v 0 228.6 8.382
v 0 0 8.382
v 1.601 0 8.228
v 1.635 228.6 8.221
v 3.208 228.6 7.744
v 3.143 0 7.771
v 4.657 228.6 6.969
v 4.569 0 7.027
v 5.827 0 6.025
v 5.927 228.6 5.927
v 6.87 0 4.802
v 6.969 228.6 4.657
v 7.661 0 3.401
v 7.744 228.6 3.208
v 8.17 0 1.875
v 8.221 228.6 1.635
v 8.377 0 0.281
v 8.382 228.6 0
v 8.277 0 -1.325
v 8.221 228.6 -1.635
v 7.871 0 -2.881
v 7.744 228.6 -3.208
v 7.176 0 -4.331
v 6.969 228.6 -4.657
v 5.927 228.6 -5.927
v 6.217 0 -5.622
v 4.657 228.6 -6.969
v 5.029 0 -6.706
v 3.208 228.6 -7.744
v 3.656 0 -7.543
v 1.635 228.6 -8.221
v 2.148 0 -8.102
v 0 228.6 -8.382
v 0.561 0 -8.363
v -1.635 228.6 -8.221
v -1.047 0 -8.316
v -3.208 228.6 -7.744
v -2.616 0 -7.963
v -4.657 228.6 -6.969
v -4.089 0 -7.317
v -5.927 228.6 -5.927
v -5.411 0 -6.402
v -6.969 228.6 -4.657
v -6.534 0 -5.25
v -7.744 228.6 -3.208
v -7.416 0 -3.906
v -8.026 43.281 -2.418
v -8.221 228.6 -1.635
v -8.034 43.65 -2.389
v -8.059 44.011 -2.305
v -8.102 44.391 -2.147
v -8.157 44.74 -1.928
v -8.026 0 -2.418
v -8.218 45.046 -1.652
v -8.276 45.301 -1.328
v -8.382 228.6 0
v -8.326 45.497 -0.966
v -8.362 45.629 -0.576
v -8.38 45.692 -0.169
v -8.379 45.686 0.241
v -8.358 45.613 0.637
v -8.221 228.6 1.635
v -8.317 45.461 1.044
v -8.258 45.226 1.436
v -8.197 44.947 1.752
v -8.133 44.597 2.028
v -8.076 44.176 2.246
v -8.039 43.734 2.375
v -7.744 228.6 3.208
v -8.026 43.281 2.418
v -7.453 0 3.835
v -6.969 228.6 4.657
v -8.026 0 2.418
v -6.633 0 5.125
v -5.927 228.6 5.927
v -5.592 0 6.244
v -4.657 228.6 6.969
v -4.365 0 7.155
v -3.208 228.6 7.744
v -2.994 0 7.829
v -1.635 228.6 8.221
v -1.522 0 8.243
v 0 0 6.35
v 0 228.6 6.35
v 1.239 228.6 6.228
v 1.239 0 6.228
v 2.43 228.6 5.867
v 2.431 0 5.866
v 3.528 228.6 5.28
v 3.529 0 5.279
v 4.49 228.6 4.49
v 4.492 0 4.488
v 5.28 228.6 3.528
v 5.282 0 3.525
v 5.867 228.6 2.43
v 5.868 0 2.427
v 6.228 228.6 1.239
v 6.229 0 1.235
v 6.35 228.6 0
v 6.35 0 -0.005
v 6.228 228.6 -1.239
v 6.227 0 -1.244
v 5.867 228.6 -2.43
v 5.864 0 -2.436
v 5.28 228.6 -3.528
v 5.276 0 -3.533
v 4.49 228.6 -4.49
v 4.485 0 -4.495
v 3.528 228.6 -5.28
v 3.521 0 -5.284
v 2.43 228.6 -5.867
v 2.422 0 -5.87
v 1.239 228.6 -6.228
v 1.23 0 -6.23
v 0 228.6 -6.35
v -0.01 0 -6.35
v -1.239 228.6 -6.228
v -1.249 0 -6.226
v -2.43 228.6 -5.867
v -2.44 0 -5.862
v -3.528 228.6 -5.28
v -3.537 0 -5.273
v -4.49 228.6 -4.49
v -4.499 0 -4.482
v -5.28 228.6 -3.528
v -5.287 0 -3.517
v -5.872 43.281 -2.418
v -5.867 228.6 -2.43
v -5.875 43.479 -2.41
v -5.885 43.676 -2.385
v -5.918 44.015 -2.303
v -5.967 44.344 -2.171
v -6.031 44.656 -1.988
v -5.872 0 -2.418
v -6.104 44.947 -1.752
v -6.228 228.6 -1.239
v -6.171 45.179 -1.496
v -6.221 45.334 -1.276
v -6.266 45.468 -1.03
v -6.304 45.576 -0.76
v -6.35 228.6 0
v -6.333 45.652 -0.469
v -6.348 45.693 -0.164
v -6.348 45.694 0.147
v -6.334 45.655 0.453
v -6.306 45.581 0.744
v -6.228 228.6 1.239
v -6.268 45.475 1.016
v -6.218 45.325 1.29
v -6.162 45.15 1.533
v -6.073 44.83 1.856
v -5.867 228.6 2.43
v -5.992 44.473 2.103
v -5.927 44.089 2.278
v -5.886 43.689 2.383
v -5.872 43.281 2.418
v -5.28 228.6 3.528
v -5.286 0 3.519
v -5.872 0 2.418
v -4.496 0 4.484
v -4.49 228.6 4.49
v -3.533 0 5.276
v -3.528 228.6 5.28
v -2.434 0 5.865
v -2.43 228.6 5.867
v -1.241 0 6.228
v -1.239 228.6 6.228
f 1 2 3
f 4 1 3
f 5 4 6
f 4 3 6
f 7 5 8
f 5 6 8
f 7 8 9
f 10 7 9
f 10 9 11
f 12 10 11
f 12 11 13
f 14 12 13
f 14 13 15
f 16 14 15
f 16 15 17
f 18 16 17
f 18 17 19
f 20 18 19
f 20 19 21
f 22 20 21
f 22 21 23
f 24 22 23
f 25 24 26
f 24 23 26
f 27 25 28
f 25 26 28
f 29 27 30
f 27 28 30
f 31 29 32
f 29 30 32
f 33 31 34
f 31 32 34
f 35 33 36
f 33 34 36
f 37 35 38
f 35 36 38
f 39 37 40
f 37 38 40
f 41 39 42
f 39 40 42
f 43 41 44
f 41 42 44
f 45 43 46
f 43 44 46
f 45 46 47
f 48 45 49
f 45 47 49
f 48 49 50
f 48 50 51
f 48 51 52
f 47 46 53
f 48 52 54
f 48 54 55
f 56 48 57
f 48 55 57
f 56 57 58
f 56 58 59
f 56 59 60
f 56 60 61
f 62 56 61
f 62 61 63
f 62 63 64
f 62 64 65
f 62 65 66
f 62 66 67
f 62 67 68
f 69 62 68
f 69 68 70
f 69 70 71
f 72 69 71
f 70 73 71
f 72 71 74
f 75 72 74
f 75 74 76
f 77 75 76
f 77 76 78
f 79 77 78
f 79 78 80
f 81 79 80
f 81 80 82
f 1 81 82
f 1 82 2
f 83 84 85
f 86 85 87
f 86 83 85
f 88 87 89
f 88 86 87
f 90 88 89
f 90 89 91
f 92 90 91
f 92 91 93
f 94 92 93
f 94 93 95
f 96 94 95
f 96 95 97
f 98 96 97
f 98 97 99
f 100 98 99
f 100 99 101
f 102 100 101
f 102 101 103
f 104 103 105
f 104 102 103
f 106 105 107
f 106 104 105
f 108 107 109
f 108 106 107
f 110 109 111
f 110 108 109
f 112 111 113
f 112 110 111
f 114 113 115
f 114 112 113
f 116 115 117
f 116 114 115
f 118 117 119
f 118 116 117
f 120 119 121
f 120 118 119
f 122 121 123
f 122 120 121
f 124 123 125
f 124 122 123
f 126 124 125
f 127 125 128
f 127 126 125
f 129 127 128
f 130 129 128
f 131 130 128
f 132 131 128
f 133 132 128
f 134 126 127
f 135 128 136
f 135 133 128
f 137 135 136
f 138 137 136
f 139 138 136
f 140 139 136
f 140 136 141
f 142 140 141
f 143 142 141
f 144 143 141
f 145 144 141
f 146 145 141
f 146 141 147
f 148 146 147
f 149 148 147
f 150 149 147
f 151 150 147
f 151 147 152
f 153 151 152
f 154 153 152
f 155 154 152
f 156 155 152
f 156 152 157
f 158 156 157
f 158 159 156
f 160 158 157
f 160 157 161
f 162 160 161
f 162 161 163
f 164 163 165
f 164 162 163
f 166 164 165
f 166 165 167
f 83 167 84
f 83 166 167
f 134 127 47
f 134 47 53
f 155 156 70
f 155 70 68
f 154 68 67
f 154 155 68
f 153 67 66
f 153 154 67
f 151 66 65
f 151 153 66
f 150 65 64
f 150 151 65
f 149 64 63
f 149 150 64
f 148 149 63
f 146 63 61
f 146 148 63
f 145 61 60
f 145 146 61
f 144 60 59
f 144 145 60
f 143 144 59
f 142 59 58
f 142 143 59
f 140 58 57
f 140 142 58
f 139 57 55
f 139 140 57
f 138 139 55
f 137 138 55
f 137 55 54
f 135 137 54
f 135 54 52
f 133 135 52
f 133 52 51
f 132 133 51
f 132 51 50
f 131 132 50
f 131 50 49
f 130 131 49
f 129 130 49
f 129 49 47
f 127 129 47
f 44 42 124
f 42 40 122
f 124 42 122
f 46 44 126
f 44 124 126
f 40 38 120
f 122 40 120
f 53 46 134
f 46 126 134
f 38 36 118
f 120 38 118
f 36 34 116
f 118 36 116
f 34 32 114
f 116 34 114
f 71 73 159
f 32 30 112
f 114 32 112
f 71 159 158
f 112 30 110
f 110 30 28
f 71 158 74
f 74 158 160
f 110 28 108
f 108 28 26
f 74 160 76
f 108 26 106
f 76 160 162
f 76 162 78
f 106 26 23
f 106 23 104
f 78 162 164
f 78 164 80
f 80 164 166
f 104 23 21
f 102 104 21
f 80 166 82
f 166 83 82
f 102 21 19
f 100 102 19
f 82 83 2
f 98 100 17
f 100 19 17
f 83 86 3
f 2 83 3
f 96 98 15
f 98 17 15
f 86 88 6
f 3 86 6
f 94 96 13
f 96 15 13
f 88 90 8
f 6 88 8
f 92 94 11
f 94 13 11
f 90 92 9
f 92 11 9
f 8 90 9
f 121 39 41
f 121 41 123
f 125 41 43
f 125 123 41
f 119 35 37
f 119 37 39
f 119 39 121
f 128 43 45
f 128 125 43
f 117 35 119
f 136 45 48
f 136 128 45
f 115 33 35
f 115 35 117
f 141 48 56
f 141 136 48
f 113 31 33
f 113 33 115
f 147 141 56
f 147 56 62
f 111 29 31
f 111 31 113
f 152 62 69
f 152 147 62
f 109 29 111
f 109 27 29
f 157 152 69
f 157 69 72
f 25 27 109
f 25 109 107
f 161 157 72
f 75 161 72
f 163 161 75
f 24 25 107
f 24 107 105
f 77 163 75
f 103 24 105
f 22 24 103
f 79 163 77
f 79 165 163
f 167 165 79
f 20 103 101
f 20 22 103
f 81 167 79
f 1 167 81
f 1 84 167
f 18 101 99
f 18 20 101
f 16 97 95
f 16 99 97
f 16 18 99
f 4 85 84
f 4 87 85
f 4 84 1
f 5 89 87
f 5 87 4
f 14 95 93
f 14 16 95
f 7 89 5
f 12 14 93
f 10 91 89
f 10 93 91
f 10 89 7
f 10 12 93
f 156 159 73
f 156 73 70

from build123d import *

# Parameters (mm, degrees)
SKETCH1_R           = 8.382
SKETCH1_R_2         = 6.35
BOSS_EXTRUDE1_DEPTH = 228.6
CUT_EXTRUDE1_DEPTH  = 228.6


with BuildPart() as part:
    # Sketch1 → Boss-Extrude1 (new body)
    with BuildSketch(Plane(origin=(0, 0, 0), x_dir=(1, 0, 0), z_dir=(0, 1, 0))):
        with Locations(Location((0, 0, 0), (0, 0, 270))):
            Circle(SKETCH1_R)
        with Locations(Location((0, 0, 0), (0, 0, 270))):
            Circle(SKETCH1_R_2, mode=Mode.SUBTRACT)
    extrude(amount=BOSS_EXTRUDE1_DEPTH)

    # Sketch3 → Cut-Extrude1 (cut)
    with BuildSketch(Plane(origin=(0, 0, 0), x_dir=(0, 0, -1), z_dir=(1, 0, 0))):
        with BuildLine():
            Line((-2.417681697, -8.09513592), (-2.417681697, 43.280600145))
            ThreePointArc((-2.417681697, 43.280600145), (0, 45.698281842), (2.417681697, 43.280600145))
            Line((2.417681697, 43.280600145), (2.417681697, -8.09513592))
            ThreePointArc((2.417681697, -8.09513592), (0, -10.512817617), (-2.417681697, -8.09513592))
        make_face()
    extrude(amount=-CUT_EXTRUDE1_DEPTH, mode=Mode.SUBTRACT)


solid = part.part
